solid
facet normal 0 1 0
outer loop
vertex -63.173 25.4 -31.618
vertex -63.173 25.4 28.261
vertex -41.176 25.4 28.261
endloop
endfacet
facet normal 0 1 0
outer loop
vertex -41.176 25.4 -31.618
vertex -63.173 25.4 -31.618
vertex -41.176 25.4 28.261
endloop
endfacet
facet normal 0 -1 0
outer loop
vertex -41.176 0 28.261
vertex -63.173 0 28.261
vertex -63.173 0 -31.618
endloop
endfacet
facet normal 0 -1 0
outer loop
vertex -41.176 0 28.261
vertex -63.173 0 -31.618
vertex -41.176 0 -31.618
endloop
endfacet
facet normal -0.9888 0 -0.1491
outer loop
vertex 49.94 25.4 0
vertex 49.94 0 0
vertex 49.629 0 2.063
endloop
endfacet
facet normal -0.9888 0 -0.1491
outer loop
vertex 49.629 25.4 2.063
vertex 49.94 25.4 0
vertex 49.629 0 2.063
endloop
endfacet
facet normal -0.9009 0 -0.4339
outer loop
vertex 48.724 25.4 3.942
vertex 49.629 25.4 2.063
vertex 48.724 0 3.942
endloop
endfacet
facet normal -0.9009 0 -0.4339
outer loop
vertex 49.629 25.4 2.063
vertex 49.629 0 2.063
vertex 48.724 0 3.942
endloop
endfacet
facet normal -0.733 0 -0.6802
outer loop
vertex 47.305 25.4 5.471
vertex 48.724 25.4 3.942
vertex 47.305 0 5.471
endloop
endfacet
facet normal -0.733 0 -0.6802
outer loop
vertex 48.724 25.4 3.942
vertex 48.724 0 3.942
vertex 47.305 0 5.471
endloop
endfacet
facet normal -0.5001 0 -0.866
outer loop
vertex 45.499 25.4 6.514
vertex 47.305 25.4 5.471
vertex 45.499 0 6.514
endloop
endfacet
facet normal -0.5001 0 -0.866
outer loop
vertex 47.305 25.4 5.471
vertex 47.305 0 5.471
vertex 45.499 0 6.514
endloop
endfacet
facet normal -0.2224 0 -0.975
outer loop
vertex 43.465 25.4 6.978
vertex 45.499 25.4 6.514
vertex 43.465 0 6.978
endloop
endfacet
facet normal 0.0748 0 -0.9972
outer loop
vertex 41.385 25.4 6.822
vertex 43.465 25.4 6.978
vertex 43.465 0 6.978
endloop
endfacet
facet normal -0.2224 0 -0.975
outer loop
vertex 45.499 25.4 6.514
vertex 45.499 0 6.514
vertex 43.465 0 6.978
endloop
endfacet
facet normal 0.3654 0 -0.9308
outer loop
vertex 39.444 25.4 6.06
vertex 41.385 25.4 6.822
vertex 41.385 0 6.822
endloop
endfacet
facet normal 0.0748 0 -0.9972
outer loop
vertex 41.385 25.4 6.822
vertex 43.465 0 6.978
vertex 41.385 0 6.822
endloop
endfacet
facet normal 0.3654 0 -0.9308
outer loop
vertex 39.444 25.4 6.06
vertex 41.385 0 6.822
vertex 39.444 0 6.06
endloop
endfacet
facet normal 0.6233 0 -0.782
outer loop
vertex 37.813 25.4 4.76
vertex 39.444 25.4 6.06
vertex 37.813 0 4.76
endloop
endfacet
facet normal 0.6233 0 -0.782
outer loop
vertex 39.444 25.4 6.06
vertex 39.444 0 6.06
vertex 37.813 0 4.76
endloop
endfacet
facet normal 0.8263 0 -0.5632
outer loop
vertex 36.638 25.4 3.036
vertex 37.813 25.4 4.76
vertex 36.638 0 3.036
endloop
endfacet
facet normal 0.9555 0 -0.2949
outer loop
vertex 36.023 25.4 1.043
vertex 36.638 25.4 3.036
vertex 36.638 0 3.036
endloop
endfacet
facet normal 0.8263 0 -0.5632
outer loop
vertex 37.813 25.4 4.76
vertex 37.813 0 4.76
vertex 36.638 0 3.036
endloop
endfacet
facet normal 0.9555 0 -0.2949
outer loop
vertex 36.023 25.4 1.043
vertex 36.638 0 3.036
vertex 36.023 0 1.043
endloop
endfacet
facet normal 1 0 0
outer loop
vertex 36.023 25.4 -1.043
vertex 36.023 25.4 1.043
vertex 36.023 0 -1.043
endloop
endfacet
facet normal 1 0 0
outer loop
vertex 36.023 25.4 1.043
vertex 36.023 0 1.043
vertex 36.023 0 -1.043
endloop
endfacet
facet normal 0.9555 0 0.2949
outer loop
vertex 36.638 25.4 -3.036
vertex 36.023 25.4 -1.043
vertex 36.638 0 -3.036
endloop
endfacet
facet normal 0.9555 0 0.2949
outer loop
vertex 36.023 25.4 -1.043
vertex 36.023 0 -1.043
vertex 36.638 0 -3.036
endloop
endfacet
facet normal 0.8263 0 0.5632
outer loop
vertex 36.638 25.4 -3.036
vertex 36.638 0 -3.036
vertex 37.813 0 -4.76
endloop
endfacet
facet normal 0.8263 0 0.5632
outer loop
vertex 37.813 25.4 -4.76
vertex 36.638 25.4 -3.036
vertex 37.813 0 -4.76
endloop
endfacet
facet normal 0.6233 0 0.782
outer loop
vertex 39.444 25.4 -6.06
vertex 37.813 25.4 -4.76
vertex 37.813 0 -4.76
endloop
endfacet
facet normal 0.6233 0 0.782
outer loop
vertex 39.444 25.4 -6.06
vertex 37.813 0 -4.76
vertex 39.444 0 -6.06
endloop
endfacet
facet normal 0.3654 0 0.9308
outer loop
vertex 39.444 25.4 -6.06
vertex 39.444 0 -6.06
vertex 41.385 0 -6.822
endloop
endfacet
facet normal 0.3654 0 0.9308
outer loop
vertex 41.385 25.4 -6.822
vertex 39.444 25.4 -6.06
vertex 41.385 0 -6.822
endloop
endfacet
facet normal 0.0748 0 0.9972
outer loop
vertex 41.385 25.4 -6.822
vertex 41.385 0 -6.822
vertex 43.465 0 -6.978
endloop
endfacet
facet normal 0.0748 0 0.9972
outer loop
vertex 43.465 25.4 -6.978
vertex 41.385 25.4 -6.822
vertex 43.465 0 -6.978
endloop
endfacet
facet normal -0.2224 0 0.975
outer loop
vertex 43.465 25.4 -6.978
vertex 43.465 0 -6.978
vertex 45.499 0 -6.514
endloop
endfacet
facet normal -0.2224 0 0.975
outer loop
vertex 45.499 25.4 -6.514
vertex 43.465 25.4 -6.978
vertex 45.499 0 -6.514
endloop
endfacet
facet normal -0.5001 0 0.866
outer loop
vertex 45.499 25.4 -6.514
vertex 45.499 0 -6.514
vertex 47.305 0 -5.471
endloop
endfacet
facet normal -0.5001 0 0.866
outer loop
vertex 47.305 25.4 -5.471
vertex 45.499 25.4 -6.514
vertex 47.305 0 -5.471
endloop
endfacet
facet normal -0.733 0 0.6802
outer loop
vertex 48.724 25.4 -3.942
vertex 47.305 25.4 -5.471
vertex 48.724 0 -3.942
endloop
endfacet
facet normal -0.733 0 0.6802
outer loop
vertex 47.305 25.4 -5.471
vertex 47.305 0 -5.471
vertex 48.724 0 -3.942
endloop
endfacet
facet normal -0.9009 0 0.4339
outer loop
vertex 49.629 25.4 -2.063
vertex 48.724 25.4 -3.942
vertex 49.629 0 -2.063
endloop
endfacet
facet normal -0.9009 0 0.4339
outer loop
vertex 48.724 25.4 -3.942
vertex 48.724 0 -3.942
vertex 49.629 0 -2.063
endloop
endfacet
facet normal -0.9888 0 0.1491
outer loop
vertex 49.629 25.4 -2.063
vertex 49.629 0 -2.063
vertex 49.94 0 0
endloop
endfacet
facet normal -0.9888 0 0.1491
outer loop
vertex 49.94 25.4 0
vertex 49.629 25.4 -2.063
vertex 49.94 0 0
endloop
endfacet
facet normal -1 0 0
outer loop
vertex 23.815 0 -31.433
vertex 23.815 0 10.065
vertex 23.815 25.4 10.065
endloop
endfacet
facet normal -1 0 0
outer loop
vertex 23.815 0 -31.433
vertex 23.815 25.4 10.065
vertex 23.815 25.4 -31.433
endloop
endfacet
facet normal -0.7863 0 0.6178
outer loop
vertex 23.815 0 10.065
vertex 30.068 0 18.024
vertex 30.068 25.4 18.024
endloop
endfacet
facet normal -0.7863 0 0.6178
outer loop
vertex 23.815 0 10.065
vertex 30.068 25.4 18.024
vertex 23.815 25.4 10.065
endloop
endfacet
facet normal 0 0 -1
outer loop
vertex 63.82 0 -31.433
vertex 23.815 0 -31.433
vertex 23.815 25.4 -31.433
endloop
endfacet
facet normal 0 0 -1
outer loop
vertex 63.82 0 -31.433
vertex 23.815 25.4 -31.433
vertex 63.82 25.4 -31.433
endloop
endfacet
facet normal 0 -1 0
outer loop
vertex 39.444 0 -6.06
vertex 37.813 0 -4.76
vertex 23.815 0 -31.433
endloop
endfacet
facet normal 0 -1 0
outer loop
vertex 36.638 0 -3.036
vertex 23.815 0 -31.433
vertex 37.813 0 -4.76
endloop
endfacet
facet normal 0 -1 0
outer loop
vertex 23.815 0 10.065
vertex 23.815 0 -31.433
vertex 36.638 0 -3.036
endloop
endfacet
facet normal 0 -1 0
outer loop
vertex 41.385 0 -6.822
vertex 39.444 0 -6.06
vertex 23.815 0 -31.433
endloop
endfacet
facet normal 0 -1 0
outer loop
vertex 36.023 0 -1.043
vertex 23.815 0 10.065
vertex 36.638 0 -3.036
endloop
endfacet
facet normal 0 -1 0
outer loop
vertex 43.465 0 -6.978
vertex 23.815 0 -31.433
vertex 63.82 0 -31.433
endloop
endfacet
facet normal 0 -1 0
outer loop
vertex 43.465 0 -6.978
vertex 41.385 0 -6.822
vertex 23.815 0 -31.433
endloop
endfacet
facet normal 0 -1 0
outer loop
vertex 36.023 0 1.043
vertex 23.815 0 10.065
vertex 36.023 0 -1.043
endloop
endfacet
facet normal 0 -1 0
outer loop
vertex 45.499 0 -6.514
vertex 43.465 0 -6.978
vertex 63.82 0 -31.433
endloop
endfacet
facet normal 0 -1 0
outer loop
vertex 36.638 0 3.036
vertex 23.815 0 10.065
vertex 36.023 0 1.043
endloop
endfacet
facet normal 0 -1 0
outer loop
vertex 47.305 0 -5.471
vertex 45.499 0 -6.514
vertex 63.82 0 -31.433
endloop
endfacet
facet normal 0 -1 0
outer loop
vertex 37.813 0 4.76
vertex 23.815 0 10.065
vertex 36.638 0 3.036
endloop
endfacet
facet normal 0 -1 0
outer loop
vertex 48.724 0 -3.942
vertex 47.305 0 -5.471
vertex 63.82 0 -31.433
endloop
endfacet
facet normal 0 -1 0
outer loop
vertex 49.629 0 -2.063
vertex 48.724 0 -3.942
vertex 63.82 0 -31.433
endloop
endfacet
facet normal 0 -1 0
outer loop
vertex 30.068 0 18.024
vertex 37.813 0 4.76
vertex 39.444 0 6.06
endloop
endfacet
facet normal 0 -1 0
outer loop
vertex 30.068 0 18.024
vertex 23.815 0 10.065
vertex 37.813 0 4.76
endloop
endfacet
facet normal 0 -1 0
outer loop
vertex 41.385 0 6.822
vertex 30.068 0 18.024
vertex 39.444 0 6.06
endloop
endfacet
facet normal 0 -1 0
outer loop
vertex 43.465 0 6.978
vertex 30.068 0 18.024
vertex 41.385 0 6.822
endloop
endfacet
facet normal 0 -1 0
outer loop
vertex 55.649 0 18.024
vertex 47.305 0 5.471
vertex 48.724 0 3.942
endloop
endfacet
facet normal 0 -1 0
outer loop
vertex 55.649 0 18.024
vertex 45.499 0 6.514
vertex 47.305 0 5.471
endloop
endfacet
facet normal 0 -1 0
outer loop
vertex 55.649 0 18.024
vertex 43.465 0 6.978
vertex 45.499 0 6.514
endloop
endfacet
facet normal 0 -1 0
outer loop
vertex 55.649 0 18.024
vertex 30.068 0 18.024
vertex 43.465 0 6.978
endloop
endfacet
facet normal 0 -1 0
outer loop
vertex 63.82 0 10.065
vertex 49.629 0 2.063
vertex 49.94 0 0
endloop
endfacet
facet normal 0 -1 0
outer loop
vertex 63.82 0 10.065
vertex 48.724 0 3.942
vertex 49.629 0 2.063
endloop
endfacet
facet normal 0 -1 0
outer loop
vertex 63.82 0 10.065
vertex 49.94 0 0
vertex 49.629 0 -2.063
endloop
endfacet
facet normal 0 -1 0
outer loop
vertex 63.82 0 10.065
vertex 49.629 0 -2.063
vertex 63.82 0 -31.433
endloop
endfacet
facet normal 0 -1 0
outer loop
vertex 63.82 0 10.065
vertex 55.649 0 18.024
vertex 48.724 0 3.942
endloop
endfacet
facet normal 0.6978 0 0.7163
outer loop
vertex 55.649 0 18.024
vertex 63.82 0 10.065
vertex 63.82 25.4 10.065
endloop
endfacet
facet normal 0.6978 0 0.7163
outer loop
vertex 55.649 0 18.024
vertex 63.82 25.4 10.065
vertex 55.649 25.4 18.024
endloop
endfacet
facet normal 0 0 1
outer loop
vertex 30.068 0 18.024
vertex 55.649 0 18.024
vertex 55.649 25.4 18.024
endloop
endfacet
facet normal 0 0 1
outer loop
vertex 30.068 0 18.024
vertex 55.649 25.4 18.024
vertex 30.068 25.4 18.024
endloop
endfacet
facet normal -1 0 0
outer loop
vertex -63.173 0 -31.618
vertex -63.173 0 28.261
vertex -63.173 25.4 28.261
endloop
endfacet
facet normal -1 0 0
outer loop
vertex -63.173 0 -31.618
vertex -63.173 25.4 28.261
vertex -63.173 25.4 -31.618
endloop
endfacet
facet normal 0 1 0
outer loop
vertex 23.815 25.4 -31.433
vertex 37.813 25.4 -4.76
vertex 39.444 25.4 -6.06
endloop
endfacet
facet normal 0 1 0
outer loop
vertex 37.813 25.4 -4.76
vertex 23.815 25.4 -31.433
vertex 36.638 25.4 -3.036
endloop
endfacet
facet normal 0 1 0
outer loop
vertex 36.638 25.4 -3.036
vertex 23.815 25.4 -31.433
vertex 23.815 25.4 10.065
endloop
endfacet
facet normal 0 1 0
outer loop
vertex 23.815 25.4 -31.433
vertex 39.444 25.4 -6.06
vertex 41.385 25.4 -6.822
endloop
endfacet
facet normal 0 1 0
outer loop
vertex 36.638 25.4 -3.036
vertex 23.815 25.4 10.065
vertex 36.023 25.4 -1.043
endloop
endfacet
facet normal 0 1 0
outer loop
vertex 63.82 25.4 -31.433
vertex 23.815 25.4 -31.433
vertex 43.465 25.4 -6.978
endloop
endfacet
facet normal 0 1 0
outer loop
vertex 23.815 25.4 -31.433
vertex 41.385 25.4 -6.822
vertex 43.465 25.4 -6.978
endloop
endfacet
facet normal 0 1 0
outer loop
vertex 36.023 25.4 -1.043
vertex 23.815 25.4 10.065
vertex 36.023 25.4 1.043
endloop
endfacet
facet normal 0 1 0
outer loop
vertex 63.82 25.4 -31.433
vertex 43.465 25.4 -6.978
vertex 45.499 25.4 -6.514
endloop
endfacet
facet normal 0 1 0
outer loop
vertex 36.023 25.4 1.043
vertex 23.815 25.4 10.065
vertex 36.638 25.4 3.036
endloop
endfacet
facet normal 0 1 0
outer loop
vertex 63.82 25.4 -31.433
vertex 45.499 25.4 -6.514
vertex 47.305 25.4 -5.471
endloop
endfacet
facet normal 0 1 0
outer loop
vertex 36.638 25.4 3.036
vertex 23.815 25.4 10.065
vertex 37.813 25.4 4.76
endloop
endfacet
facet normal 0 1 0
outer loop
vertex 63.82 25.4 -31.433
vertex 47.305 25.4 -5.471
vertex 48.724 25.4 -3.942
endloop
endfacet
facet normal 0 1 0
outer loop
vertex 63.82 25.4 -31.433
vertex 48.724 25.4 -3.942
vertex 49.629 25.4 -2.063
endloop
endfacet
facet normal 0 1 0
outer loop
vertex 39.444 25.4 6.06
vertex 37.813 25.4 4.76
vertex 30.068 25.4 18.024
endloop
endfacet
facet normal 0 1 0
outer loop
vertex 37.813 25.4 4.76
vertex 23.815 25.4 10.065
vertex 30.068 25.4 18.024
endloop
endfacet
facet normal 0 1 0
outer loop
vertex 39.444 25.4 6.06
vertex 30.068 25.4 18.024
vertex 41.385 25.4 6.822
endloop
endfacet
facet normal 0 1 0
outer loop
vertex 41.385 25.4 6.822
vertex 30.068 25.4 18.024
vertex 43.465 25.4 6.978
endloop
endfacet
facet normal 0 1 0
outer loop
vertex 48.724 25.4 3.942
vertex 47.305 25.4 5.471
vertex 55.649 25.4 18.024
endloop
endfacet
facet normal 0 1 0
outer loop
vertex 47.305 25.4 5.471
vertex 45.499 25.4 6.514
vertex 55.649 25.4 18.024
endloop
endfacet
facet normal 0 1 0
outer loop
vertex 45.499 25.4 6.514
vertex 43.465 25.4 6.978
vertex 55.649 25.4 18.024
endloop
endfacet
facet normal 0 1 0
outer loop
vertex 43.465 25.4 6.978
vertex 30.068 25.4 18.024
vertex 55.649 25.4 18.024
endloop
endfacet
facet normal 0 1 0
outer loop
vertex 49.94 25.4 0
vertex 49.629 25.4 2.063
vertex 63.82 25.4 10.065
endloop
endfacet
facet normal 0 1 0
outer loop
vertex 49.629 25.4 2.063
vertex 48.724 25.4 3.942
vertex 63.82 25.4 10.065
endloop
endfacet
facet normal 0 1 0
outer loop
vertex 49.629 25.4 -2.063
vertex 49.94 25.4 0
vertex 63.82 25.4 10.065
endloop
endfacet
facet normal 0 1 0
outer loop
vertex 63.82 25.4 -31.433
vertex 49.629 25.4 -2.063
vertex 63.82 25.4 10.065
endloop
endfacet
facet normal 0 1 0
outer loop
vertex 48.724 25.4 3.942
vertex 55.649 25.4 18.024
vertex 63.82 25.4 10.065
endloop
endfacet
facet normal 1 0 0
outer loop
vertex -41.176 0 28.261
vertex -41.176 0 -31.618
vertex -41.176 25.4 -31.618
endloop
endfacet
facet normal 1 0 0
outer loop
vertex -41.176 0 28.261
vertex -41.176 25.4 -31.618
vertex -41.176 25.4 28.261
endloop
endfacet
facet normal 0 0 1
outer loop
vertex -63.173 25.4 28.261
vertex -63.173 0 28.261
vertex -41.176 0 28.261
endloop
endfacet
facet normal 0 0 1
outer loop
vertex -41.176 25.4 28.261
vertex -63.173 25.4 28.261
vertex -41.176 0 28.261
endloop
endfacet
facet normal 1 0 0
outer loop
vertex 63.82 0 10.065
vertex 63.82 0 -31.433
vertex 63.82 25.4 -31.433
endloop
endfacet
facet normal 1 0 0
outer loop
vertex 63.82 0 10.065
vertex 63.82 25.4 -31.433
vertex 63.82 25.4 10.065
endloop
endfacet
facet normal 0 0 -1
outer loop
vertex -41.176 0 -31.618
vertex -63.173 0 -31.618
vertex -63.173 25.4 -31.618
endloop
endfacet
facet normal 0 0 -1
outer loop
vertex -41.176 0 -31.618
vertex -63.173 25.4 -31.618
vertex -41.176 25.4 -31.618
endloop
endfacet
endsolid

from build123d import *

# Parameters (mm, degrees)
F0_W     = 21.9964
F0_H     = 7.27937
F0_R     = 6.9977
F0_H_2   = 52.599722
F1_DEPTH = 25.4


with BuildPart() as f1:
    # F0 (on Front) → F1 (new body)
    with BuildSketch(Plane.XZ):
        with Locations((-52.174352, 24.621328)):
            Rectangle(F0_W, F0_H)
        Polygon((55.649079, 18.023642), (30.067971, 18.023642), (23.814812, 10.065076), (23.814812, -31.433165), (63.819812, -31.433165), (63.819812, 10.065076), align=None)
        with Locations((42.942431, 0)):
            Circle(F0_R, mode=Mode.SUBTRACT)
        with Locations((-52.174352, -5.318218)):
            Rectangle(F0_W, F0_H_2)
    extrude(amount=-F1_DEPTH)


solid = f1.part
